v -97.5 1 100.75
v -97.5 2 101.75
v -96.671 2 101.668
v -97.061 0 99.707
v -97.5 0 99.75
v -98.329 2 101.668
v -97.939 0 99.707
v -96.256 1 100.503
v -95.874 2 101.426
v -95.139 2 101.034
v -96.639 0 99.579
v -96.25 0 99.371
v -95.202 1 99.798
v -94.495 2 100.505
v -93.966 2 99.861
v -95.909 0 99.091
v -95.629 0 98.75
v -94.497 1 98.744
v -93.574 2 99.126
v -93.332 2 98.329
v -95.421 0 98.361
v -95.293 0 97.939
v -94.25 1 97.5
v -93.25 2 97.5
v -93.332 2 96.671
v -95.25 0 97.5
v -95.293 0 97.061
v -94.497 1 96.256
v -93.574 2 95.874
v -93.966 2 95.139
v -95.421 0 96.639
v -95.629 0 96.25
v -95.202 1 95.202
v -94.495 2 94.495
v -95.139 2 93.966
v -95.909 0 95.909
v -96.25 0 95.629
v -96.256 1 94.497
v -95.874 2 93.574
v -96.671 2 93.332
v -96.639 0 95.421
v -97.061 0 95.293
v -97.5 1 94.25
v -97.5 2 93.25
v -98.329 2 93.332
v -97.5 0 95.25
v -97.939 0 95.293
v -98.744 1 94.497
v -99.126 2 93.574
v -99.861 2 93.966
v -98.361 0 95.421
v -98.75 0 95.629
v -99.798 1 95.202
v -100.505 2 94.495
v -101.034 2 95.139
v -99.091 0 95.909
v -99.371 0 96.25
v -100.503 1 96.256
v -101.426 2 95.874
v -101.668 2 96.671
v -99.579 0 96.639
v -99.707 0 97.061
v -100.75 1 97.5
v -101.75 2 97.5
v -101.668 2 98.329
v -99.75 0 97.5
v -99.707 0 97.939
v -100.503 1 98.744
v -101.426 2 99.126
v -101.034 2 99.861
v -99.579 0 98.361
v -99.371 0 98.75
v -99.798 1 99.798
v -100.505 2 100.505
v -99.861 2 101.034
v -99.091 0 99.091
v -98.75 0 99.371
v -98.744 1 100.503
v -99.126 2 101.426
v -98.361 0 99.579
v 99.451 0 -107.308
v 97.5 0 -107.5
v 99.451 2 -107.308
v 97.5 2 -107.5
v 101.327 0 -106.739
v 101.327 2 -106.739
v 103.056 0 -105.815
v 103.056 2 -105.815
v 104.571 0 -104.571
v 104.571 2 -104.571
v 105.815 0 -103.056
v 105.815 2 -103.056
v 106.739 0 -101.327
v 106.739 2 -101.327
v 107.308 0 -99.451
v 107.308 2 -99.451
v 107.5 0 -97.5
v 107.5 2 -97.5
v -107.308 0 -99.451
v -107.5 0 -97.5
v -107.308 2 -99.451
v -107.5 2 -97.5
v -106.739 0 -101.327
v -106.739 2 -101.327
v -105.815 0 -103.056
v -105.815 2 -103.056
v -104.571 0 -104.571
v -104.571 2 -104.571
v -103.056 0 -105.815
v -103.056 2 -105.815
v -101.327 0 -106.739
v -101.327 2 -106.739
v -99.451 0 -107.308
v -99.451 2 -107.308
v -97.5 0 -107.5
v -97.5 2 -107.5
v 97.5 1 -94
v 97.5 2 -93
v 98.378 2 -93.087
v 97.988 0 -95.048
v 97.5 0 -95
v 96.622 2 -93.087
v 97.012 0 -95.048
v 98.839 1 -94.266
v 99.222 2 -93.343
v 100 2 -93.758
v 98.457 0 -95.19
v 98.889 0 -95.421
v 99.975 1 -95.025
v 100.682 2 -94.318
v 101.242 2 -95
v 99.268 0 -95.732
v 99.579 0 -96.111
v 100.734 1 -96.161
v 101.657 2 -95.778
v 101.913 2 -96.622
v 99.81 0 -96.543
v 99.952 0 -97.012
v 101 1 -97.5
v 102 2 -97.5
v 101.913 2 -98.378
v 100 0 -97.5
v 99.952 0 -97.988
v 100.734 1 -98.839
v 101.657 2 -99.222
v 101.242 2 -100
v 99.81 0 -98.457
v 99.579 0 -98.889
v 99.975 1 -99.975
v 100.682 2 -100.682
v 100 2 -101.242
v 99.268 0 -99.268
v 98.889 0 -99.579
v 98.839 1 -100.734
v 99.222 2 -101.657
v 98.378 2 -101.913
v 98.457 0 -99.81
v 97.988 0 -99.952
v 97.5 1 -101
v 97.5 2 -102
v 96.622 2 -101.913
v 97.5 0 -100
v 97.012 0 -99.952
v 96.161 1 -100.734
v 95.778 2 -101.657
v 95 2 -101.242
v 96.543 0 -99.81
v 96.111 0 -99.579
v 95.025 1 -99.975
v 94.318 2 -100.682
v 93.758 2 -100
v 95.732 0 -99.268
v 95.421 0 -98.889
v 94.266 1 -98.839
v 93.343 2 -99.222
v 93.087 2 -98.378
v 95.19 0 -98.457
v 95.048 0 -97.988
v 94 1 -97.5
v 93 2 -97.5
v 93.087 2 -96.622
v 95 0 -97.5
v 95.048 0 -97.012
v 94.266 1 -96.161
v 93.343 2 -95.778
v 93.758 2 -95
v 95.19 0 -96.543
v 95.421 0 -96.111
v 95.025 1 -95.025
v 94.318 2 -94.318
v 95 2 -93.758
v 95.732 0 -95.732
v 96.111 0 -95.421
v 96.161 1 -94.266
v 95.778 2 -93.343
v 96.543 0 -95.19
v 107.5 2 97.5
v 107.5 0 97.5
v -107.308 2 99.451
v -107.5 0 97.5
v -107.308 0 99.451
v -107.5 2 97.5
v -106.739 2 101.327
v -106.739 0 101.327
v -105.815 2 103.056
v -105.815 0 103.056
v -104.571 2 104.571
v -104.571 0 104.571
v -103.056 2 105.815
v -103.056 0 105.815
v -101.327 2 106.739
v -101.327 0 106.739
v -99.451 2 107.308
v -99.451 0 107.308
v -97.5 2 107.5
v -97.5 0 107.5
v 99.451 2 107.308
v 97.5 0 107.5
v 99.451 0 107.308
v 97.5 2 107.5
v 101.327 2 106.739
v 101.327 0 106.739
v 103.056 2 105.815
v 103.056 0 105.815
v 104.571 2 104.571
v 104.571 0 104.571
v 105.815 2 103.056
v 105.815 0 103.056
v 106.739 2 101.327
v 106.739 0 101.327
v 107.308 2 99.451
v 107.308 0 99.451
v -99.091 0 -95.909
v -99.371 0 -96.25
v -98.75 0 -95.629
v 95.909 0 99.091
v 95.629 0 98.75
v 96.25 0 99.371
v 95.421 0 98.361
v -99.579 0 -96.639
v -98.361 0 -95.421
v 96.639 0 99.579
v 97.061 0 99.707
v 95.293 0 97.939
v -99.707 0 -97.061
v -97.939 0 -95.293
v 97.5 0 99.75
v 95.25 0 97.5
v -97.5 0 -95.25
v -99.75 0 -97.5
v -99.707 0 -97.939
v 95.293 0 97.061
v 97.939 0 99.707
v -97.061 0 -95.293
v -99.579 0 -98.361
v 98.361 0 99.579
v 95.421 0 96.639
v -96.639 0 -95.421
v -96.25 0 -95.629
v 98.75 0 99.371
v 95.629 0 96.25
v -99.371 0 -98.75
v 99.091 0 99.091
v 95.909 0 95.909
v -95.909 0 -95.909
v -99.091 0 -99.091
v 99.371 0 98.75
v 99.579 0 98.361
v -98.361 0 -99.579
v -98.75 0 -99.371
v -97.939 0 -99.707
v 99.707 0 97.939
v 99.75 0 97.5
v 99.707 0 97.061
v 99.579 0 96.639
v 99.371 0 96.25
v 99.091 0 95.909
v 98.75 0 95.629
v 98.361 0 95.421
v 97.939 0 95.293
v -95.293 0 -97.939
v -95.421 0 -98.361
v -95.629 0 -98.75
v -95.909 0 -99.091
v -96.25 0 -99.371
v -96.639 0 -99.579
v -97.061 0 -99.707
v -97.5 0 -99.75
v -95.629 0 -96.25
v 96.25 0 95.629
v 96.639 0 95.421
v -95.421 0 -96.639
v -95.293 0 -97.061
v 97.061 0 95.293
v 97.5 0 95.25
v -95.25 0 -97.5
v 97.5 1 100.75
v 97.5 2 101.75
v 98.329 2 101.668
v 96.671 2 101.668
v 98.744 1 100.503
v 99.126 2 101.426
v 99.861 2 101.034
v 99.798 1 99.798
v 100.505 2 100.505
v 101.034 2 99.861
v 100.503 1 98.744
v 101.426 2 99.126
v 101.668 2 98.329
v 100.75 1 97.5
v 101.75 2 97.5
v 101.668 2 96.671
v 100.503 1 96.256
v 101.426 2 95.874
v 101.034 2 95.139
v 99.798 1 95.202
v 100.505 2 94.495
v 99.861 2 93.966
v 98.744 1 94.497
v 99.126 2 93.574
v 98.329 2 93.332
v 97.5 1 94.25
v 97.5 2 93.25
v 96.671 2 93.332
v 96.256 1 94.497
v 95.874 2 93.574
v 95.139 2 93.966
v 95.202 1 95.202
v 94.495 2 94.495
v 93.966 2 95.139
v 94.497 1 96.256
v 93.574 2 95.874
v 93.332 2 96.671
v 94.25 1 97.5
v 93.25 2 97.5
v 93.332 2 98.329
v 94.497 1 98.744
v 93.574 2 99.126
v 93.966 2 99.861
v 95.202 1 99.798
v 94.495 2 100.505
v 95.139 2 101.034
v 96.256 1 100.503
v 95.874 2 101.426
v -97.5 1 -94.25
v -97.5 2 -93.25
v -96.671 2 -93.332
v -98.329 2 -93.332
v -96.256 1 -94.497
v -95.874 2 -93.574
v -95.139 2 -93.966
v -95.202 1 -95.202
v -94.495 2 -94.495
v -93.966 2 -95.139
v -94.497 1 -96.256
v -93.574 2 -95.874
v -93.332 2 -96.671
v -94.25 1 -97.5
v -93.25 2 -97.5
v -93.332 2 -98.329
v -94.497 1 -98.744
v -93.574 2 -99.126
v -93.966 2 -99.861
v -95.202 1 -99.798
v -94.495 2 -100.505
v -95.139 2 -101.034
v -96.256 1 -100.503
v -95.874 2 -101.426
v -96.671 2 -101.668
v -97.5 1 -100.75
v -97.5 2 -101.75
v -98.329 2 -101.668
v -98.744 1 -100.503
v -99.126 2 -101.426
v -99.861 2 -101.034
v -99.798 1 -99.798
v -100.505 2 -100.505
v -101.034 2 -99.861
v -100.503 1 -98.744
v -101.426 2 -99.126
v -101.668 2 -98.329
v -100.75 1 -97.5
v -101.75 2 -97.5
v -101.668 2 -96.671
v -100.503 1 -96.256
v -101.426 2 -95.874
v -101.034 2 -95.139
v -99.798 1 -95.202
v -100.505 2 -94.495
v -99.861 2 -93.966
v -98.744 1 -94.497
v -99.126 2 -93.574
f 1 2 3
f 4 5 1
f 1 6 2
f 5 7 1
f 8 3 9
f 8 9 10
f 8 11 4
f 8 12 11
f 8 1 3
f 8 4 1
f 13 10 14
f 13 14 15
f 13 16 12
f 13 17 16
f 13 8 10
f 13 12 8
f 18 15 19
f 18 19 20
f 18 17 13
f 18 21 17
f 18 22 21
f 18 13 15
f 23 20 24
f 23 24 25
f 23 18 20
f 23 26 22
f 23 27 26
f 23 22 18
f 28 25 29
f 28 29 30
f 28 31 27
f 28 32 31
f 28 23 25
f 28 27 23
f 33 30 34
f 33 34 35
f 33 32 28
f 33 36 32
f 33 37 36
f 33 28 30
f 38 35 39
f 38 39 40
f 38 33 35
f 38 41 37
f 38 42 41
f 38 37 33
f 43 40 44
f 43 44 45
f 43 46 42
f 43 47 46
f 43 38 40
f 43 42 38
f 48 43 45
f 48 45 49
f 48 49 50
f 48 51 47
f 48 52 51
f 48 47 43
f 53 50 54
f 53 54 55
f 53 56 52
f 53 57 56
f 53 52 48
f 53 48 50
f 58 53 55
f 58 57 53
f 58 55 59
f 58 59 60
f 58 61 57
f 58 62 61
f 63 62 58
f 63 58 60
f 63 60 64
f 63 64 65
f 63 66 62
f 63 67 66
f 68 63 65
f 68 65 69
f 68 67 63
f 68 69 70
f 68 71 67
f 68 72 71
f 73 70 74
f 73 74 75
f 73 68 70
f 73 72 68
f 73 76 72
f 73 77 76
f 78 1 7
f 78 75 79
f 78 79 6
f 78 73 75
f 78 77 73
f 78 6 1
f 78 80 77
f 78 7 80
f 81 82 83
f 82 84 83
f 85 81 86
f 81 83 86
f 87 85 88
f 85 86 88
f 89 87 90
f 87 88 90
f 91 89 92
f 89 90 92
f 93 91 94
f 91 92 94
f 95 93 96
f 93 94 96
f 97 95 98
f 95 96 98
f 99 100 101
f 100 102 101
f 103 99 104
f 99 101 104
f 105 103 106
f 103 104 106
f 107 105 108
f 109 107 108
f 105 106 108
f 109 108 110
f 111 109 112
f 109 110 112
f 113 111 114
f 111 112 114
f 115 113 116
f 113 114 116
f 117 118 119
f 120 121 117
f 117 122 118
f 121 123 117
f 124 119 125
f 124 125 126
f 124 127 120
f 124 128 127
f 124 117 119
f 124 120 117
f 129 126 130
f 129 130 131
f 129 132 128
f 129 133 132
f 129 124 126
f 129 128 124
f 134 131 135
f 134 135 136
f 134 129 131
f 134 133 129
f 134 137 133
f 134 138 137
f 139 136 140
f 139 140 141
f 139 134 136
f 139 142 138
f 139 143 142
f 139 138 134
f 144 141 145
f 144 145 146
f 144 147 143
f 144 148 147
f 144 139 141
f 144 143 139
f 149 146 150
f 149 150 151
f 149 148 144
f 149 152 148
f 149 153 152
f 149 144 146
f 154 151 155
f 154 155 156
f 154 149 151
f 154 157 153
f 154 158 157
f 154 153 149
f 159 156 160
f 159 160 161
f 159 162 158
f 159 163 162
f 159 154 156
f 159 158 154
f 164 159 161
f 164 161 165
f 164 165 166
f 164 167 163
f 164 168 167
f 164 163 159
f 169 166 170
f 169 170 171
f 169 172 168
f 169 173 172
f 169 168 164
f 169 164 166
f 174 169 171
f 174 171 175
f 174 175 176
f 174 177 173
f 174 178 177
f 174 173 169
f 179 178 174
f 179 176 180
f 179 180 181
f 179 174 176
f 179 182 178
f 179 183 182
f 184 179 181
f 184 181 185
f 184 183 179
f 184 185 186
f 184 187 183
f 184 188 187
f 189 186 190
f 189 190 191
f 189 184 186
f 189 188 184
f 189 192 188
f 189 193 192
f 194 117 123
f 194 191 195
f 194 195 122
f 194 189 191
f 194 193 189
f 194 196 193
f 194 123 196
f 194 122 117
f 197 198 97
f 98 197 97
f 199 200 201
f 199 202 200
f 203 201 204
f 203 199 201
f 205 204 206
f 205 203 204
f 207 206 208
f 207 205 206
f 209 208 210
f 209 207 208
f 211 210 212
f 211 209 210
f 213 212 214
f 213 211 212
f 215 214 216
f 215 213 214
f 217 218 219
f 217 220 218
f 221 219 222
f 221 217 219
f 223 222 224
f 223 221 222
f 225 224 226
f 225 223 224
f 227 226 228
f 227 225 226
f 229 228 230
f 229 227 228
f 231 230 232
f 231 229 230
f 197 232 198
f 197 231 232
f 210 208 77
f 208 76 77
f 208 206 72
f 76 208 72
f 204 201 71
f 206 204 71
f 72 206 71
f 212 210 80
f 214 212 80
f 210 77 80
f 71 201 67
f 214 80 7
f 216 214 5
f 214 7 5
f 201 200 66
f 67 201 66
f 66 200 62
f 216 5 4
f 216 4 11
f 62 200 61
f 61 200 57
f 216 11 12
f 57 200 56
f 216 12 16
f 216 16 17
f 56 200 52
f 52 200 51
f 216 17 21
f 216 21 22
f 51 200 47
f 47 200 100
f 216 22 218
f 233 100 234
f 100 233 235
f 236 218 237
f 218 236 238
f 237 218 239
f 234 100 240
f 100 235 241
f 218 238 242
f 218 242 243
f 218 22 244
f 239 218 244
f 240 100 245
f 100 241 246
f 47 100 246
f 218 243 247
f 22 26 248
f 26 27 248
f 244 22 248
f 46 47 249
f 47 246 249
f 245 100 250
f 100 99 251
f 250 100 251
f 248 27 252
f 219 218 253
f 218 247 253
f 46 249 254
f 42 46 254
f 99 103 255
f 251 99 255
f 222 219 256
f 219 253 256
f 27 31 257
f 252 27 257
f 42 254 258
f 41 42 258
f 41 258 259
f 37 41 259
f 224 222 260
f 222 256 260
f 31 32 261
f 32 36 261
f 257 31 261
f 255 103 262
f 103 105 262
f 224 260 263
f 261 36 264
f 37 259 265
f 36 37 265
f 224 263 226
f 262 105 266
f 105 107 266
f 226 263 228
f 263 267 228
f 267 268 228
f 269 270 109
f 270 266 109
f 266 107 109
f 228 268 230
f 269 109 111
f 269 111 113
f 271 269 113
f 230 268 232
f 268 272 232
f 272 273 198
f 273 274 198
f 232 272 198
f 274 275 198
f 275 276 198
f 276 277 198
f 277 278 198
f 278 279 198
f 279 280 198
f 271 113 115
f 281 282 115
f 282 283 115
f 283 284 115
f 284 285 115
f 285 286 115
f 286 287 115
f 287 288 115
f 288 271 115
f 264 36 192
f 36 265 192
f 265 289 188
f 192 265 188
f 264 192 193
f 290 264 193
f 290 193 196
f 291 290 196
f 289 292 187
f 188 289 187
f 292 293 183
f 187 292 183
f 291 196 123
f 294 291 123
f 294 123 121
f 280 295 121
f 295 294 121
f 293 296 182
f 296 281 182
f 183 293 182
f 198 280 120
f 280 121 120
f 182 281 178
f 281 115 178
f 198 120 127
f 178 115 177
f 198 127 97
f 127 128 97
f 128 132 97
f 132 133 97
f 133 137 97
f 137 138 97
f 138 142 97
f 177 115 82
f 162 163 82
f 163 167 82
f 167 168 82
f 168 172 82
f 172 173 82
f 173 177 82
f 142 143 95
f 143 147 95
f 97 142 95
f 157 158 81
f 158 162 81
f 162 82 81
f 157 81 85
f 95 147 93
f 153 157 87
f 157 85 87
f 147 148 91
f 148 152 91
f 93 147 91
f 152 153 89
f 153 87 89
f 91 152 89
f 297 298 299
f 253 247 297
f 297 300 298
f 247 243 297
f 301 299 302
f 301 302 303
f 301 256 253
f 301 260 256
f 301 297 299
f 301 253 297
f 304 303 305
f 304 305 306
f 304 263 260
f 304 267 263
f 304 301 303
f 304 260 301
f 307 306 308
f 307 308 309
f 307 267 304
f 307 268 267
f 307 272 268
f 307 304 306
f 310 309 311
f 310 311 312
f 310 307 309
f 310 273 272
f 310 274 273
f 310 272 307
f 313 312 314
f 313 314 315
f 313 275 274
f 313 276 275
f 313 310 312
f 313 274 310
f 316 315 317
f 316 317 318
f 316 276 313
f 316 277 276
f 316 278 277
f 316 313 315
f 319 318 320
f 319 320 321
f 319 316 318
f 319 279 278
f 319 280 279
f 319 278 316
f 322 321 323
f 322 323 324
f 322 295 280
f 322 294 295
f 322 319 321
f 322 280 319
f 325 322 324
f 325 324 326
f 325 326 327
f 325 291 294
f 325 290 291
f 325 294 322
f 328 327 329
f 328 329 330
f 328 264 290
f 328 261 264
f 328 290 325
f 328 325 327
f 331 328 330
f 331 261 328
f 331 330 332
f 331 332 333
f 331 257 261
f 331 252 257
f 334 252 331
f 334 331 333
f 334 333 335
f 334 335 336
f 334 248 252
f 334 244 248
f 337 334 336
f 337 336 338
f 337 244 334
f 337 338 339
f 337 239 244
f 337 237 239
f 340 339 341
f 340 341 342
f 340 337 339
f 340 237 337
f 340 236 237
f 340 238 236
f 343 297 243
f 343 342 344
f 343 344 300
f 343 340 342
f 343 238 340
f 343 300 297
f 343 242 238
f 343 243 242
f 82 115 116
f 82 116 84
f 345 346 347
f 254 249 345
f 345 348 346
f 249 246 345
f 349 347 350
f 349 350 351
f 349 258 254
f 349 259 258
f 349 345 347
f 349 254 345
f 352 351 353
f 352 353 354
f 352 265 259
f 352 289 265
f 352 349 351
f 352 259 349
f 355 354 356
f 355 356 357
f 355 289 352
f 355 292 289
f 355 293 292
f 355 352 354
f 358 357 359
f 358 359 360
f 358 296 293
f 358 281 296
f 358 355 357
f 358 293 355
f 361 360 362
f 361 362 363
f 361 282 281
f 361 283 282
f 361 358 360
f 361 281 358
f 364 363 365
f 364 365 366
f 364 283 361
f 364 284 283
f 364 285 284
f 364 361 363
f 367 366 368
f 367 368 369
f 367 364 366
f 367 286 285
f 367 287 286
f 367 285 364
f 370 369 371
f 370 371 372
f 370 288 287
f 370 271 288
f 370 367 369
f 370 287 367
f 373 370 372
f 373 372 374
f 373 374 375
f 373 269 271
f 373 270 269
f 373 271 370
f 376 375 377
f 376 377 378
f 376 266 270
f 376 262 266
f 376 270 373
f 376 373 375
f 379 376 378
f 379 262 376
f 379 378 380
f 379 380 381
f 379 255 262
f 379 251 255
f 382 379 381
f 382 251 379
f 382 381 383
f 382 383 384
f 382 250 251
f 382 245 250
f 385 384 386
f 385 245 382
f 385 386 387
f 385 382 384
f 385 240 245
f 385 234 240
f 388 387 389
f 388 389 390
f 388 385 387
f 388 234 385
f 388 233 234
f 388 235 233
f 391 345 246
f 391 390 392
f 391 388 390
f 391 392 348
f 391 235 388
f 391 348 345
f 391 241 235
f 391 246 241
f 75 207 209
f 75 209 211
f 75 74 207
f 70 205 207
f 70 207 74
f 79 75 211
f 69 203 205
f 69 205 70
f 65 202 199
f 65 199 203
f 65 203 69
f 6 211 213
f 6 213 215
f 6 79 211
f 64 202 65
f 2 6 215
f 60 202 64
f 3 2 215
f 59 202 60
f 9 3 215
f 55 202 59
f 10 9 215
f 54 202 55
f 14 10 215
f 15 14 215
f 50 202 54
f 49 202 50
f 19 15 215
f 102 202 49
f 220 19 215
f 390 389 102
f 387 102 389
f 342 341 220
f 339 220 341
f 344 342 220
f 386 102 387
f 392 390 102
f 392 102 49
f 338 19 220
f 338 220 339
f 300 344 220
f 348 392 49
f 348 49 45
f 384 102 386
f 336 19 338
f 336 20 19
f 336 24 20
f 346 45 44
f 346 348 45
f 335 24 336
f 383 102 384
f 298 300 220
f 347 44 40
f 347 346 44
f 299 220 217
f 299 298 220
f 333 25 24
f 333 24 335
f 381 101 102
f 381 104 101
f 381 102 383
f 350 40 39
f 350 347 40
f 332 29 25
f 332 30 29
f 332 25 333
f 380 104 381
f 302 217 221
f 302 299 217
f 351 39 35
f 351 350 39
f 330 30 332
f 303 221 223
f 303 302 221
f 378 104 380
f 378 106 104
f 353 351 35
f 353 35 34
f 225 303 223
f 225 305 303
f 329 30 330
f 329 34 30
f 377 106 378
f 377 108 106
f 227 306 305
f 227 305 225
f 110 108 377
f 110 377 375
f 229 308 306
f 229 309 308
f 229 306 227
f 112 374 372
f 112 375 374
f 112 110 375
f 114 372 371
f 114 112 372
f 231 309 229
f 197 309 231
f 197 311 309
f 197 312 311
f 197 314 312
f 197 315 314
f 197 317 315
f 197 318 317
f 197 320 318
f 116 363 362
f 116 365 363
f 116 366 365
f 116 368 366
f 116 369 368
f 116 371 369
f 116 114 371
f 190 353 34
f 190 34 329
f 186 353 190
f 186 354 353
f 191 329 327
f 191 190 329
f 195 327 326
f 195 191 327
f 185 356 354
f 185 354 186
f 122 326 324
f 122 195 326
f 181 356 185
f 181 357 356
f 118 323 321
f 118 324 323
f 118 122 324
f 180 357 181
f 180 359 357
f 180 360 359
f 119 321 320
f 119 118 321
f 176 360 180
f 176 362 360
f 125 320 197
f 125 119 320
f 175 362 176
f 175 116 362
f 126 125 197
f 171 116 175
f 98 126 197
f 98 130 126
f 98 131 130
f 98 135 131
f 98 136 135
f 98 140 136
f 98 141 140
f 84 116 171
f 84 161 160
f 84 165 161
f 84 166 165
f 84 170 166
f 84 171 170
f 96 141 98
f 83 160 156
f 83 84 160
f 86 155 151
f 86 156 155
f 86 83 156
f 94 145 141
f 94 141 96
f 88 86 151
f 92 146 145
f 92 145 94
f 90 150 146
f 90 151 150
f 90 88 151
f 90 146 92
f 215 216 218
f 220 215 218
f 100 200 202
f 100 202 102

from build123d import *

# Parameters (mm, degrees)
SKETCH1_W           = 215
SKETCH1_H           = 215
BOSS_EXTRUDE1_DEPTH = 2
SKETCH2_R           = 2.25
SKETCH2_R_2         = 2.5
CUT_EXTRUDE1_DEPTH  = 153.041112861
CHAMFER1_SIZE       = 2
FILLET1_R           = 10


with BuildPart() as part:
    # Sketch1 → Boss-Extrude1 (new body)
    with BuildSketch(Plane(origin=(0, 0, 0), x_dir=(1, 0, 0), z_dir=(0, 1, 0))):
        Rectangle(SKETCH1_W, SKETCH1_H)
    extrude(amount=BOSS_EXTRUDE1_DEPTH)

    # Sketch2 → Cut-Extrude1 (cut, through all)
    with BuildSketch(Plane(origin=(0, 2, 0), x_dir=(1, 0, 0), z_dir=(0, 1, 0))):
        with Locations(Location((-97.5, 97.5, 0), (0, 0, 270))):
            Circle(SKETCH2_R)
        with Locations(Location((-97.5, -97.5, 0), (0, 0, 270))):
            Circle(SKETCH2_R)
        with Locations(Location((97.5, -97.5, 0), (0, 0, 270))):
            Circle(SKETCH2_R)
        with Locations(Location((97.5, 97.5, 0), (0, 0, 270))):
            Circle(SKETCH2_R_2)
    extrude(amount=-CUT_EXTRUDE1_DEPTH, mode=Mode.SUBTRACT)

    # Chamfer1
    chamfer1_edges = [part.edges().sort_by_distance(p)[0] for p in [
        (-97.5, 2, -99.75),
        (-97.5, 2, 95.25),
        (97.5, 2, 95.25),
        (97.5, 2, -100),
    ]]
    chamfer(chamfer1_edges, length=CHAMFER1_SIZE - 0.0001)  # a hair under: the kernel refuses the full size

    # Fillet1
    fillet1_edges = [part.edges().sort_by_distance(p)[0] for p in [
        (-107.5, 1, -107.5),
        (107.5, 1, -107.5),
        (107.5, 1, 107.5),
        (-107.5, 1, 107.5),
    ]]
    fillet(fillet1_edges, radius=FILLET1_R)


solid = part.part
